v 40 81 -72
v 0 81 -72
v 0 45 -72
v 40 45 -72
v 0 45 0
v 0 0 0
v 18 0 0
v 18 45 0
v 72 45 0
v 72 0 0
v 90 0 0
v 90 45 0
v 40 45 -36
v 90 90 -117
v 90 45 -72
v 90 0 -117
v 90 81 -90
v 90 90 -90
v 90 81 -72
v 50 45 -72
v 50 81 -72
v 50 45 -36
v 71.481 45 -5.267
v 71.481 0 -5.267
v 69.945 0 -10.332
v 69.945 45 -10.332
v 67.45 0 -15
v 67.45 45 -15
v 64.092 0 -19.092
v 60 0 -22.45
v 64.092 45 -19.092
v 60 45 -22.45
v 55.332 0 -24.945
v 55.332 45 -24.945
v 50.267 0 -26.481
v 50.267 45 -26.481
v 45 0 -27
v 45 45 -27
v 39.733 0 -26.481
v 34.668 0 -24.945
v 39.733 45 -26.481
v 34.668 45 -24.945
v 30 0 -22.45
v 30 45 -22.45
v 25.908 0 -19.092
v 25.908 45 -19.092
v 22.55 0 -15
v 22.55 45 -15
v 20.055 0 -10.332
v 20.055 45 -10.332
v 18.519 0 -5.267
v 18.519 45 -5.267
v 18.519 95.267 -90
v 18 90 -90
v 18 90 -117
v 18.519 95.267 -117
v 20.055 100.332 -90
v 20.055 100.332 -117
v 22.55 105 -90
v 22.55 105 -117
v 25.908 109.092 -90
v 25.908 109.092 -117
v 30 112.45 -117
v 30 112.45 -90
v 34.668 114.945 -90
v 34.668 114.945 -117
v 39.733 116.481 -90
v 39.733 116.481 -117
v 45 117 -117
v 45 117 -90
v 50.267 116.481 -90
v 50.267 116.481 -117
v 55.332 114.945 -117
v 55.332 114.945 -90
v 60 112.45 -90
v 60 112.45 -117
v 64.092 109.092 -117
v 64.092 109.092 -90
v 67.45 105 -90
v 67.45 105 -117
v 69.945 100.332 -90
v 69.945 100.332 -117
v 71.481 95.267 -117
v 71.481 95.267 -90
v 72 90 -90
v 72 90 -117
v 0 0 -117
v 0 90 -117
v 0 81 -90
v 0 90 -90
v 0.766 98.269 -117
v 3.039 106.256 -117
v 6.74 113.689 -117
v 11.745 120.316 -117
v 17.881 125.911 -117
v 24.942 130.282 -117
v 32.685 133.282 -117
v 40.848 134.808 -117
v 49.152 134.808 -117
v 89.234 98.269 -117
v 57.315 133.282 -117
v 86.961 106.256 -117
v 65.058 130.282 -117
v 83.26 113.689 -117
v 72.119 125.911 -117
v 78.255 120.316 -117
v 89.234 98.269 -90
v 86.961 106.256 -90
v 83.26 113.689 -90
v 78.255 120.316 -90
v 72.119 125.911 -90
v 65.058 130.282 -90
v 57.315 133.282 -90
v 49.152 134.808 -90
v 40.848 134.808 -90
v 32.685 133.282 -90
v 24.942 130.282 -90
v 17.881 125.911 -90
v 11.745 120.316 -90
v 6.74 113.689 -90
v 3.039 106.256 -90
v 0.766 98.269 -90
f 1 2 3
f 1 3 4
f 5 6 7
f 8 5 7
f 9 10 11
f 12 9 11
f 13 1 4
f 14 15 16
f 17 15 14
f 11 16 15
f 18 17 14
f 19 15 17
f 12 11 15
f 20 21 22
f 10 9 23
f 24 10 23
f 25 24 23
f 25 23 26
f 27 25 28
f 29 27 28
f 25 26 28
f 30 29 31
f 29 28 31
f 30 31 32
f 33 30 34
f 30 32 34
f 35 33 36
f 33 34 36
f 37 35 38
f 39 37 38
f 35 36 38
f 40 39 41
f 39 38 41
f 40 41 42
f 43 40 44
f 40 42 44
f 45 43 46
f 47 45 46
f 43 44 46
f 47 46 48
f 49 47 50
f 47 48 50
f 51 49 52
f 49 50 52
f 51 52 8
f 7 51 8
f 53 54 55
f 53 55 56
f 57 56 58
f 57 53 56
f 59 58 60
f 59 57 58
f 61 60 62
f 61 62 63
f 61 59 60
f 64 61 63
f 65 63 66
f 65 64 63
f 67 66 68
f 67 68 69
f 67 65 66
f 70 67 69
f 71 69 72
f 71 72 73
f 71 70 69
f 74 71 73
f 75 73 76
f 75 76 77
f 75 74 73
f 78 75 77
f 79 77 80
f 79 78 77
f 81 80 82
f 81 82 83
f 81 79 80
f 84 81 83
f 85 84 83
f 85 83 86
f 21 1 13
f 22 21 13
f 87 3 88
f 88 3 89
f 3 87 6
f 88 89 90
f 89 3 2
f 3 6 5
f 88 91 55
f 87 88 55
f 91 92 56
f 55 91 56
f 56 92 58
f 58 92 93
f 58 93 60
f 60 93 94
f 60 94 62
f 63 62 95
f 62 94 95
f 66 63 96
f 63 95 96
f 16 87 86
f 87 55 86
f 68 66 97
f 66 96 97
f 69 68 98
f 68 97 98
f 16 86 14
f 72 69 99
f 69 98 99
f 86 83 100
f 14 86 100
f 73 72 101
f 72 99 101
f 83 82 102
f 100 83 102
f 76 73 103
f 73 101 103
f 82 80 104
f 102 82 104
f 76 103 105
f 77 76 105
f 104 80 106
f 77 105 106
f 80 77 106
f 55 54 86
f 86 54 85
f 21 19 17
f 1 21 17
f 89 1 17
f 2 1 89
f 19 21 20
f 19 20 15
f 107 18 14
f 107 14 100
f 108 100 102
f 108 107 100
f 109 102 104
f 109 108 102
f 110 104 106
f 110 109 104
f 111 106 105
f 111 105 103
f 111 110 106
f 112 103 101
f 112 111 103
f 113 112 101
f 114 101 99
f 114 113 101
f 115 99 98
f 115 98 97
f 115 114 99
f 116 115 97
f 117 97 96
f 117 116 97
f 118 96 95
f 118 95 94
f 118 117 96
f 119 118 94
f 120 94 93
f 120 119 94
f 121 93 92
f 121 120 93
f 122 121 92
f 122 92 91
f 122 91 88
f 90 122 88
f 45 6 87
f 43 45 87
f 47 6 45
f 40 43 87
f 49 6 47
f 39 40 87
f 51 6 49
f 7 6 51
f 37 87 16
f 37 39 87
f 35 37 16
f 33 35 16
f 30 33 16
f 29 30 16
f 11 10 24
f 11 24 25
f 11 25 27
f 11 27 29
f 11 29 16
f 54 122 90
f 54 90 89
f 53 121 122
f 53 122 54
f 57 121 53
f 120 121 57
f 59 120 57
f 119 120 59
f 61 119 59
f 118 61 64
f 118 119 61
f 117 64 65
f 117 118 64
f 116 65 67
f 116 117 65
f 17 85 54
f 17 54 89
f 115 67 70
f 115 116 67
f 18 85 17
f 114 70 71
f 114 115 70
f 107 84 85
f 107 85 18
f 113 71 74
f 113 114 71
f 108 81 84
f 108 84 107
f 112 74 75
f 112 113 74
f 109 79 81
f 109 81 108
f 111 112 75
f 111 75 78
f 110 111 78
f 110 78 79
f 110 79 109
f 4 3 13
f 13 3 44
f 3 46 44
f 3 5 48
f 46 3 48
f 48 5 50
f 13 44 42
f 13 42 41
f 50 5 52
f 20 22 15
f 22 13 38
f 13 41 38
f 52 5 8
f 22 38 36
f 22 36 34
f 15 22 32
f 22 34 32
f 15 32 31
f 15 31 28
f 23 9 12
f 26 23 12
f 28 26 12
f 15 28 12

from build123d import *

# Parameters (mm, degrees)
BOSS_EXTRUDE1_DEPTH = 117
BOSS_EXTRUDE2_START = -72
BOSS_EXTRUDE2_DEPTH = 45
BOSS_EXTRUDE4_START = -90
BOSS_EXTRUDE4_DEPTH = 27
BOSS_EXTRUDE5_START = -90
BOSS_EXTRUDE5_DEPTH = 27
CUT_EXTRUDE1_DEPTH  = 173.884354411
RIB4_REACH          = 186.225
SKETCH5_WALL_W      = 421.362499074
SKETCH5_WALL_H      = 10


with BuildPart() as part:
    # Sketch1 → Boss-Extrude1 (new body)
    with BuildSketch(Plane.XY):
        Polygon((0, 45), (0, 0), (90, 0), (90, 45), (68.497865987, 45), align=None)
    extrude(amount=-BOSS_EXTRUDE1_DEPTH)

    # Sketch1<3> → Boss-Extrude2 (add)
    with BuildSketch(Plane.XY.offset(BOSS_EXTRUDE2_START)):
        Polygon((0, 81), (0, 45), (68.497865987, 45), (90, 45), (90, 81), align=None)
    extrude(amount=-BOSS_EXTRUDE2_DEPTH)

    # Sketch1<5> → Boss-Extrude4 (add)
    with BuildSketch(Plane.XY.offset(BOSS_EXTRUDE4_START)):
        Polygon((0, 90), (0, 81), (90, 81), (90, 90), (72, 90), (18, 90), align=None)
    extrude(amount=-BOSS_EXTRUDE4_DEPTH)

    # Sketch1<6> → Boss-Extrude5 (add)
    with BuildSketch(Plane.XY.offset(BOSS_EXTRUDE5_START)):
        with BuildLine():
            ThreePointArc((90, 90), (45, 135), (0, 90))
            Line((0, 90), (18, 90))
            ThreePointArc((18, 90), (45, 117), (72, 90))
            Line((72, 90), (90, 90))
        make_face()
    extrude(amount=-BOSS_EXTRUDE5_DEPTH)

    # Sketch2 → Cut-Extrude1 (cut, through all)
    with BuildSketch(Plane(origin=(0, 45, 0), x_dir=(1, 0, 0), z_dir=(0, 1, 0))):
        with BuildLine():
            Line((18, 0), (72, 0))
            ThreePointArc((72, 0), (45, 27), (18, 0))
        make_face()
    extrude(amount=-CUT_EXTRUDE1_DEPTH, mode=Mode.SUBTRACT)

    # Sketch5 wall → Rib4 (add, up to next)
    with BuildSketch(Plane(origin=(45, 63, -54), x_dir=(0, -0.707106781187, 0.707106781187), z_dir=(0, -0.707106781187, -0.707106781187)), mode=Mode.PRIVATE) as rib4_sk1:
        Rectangle(SKETCH5_WALL_W, SKETCH5_WALL_H)
    rib4_tool1 = extrude(rib4_sk1.sketch, amount=RIB4_REACH, mode=Mode.PRIVATE) - part.part
    add(rib4_tool1.solids().sort_by_distance((45, 63, -54))[0])


solid = part.part
